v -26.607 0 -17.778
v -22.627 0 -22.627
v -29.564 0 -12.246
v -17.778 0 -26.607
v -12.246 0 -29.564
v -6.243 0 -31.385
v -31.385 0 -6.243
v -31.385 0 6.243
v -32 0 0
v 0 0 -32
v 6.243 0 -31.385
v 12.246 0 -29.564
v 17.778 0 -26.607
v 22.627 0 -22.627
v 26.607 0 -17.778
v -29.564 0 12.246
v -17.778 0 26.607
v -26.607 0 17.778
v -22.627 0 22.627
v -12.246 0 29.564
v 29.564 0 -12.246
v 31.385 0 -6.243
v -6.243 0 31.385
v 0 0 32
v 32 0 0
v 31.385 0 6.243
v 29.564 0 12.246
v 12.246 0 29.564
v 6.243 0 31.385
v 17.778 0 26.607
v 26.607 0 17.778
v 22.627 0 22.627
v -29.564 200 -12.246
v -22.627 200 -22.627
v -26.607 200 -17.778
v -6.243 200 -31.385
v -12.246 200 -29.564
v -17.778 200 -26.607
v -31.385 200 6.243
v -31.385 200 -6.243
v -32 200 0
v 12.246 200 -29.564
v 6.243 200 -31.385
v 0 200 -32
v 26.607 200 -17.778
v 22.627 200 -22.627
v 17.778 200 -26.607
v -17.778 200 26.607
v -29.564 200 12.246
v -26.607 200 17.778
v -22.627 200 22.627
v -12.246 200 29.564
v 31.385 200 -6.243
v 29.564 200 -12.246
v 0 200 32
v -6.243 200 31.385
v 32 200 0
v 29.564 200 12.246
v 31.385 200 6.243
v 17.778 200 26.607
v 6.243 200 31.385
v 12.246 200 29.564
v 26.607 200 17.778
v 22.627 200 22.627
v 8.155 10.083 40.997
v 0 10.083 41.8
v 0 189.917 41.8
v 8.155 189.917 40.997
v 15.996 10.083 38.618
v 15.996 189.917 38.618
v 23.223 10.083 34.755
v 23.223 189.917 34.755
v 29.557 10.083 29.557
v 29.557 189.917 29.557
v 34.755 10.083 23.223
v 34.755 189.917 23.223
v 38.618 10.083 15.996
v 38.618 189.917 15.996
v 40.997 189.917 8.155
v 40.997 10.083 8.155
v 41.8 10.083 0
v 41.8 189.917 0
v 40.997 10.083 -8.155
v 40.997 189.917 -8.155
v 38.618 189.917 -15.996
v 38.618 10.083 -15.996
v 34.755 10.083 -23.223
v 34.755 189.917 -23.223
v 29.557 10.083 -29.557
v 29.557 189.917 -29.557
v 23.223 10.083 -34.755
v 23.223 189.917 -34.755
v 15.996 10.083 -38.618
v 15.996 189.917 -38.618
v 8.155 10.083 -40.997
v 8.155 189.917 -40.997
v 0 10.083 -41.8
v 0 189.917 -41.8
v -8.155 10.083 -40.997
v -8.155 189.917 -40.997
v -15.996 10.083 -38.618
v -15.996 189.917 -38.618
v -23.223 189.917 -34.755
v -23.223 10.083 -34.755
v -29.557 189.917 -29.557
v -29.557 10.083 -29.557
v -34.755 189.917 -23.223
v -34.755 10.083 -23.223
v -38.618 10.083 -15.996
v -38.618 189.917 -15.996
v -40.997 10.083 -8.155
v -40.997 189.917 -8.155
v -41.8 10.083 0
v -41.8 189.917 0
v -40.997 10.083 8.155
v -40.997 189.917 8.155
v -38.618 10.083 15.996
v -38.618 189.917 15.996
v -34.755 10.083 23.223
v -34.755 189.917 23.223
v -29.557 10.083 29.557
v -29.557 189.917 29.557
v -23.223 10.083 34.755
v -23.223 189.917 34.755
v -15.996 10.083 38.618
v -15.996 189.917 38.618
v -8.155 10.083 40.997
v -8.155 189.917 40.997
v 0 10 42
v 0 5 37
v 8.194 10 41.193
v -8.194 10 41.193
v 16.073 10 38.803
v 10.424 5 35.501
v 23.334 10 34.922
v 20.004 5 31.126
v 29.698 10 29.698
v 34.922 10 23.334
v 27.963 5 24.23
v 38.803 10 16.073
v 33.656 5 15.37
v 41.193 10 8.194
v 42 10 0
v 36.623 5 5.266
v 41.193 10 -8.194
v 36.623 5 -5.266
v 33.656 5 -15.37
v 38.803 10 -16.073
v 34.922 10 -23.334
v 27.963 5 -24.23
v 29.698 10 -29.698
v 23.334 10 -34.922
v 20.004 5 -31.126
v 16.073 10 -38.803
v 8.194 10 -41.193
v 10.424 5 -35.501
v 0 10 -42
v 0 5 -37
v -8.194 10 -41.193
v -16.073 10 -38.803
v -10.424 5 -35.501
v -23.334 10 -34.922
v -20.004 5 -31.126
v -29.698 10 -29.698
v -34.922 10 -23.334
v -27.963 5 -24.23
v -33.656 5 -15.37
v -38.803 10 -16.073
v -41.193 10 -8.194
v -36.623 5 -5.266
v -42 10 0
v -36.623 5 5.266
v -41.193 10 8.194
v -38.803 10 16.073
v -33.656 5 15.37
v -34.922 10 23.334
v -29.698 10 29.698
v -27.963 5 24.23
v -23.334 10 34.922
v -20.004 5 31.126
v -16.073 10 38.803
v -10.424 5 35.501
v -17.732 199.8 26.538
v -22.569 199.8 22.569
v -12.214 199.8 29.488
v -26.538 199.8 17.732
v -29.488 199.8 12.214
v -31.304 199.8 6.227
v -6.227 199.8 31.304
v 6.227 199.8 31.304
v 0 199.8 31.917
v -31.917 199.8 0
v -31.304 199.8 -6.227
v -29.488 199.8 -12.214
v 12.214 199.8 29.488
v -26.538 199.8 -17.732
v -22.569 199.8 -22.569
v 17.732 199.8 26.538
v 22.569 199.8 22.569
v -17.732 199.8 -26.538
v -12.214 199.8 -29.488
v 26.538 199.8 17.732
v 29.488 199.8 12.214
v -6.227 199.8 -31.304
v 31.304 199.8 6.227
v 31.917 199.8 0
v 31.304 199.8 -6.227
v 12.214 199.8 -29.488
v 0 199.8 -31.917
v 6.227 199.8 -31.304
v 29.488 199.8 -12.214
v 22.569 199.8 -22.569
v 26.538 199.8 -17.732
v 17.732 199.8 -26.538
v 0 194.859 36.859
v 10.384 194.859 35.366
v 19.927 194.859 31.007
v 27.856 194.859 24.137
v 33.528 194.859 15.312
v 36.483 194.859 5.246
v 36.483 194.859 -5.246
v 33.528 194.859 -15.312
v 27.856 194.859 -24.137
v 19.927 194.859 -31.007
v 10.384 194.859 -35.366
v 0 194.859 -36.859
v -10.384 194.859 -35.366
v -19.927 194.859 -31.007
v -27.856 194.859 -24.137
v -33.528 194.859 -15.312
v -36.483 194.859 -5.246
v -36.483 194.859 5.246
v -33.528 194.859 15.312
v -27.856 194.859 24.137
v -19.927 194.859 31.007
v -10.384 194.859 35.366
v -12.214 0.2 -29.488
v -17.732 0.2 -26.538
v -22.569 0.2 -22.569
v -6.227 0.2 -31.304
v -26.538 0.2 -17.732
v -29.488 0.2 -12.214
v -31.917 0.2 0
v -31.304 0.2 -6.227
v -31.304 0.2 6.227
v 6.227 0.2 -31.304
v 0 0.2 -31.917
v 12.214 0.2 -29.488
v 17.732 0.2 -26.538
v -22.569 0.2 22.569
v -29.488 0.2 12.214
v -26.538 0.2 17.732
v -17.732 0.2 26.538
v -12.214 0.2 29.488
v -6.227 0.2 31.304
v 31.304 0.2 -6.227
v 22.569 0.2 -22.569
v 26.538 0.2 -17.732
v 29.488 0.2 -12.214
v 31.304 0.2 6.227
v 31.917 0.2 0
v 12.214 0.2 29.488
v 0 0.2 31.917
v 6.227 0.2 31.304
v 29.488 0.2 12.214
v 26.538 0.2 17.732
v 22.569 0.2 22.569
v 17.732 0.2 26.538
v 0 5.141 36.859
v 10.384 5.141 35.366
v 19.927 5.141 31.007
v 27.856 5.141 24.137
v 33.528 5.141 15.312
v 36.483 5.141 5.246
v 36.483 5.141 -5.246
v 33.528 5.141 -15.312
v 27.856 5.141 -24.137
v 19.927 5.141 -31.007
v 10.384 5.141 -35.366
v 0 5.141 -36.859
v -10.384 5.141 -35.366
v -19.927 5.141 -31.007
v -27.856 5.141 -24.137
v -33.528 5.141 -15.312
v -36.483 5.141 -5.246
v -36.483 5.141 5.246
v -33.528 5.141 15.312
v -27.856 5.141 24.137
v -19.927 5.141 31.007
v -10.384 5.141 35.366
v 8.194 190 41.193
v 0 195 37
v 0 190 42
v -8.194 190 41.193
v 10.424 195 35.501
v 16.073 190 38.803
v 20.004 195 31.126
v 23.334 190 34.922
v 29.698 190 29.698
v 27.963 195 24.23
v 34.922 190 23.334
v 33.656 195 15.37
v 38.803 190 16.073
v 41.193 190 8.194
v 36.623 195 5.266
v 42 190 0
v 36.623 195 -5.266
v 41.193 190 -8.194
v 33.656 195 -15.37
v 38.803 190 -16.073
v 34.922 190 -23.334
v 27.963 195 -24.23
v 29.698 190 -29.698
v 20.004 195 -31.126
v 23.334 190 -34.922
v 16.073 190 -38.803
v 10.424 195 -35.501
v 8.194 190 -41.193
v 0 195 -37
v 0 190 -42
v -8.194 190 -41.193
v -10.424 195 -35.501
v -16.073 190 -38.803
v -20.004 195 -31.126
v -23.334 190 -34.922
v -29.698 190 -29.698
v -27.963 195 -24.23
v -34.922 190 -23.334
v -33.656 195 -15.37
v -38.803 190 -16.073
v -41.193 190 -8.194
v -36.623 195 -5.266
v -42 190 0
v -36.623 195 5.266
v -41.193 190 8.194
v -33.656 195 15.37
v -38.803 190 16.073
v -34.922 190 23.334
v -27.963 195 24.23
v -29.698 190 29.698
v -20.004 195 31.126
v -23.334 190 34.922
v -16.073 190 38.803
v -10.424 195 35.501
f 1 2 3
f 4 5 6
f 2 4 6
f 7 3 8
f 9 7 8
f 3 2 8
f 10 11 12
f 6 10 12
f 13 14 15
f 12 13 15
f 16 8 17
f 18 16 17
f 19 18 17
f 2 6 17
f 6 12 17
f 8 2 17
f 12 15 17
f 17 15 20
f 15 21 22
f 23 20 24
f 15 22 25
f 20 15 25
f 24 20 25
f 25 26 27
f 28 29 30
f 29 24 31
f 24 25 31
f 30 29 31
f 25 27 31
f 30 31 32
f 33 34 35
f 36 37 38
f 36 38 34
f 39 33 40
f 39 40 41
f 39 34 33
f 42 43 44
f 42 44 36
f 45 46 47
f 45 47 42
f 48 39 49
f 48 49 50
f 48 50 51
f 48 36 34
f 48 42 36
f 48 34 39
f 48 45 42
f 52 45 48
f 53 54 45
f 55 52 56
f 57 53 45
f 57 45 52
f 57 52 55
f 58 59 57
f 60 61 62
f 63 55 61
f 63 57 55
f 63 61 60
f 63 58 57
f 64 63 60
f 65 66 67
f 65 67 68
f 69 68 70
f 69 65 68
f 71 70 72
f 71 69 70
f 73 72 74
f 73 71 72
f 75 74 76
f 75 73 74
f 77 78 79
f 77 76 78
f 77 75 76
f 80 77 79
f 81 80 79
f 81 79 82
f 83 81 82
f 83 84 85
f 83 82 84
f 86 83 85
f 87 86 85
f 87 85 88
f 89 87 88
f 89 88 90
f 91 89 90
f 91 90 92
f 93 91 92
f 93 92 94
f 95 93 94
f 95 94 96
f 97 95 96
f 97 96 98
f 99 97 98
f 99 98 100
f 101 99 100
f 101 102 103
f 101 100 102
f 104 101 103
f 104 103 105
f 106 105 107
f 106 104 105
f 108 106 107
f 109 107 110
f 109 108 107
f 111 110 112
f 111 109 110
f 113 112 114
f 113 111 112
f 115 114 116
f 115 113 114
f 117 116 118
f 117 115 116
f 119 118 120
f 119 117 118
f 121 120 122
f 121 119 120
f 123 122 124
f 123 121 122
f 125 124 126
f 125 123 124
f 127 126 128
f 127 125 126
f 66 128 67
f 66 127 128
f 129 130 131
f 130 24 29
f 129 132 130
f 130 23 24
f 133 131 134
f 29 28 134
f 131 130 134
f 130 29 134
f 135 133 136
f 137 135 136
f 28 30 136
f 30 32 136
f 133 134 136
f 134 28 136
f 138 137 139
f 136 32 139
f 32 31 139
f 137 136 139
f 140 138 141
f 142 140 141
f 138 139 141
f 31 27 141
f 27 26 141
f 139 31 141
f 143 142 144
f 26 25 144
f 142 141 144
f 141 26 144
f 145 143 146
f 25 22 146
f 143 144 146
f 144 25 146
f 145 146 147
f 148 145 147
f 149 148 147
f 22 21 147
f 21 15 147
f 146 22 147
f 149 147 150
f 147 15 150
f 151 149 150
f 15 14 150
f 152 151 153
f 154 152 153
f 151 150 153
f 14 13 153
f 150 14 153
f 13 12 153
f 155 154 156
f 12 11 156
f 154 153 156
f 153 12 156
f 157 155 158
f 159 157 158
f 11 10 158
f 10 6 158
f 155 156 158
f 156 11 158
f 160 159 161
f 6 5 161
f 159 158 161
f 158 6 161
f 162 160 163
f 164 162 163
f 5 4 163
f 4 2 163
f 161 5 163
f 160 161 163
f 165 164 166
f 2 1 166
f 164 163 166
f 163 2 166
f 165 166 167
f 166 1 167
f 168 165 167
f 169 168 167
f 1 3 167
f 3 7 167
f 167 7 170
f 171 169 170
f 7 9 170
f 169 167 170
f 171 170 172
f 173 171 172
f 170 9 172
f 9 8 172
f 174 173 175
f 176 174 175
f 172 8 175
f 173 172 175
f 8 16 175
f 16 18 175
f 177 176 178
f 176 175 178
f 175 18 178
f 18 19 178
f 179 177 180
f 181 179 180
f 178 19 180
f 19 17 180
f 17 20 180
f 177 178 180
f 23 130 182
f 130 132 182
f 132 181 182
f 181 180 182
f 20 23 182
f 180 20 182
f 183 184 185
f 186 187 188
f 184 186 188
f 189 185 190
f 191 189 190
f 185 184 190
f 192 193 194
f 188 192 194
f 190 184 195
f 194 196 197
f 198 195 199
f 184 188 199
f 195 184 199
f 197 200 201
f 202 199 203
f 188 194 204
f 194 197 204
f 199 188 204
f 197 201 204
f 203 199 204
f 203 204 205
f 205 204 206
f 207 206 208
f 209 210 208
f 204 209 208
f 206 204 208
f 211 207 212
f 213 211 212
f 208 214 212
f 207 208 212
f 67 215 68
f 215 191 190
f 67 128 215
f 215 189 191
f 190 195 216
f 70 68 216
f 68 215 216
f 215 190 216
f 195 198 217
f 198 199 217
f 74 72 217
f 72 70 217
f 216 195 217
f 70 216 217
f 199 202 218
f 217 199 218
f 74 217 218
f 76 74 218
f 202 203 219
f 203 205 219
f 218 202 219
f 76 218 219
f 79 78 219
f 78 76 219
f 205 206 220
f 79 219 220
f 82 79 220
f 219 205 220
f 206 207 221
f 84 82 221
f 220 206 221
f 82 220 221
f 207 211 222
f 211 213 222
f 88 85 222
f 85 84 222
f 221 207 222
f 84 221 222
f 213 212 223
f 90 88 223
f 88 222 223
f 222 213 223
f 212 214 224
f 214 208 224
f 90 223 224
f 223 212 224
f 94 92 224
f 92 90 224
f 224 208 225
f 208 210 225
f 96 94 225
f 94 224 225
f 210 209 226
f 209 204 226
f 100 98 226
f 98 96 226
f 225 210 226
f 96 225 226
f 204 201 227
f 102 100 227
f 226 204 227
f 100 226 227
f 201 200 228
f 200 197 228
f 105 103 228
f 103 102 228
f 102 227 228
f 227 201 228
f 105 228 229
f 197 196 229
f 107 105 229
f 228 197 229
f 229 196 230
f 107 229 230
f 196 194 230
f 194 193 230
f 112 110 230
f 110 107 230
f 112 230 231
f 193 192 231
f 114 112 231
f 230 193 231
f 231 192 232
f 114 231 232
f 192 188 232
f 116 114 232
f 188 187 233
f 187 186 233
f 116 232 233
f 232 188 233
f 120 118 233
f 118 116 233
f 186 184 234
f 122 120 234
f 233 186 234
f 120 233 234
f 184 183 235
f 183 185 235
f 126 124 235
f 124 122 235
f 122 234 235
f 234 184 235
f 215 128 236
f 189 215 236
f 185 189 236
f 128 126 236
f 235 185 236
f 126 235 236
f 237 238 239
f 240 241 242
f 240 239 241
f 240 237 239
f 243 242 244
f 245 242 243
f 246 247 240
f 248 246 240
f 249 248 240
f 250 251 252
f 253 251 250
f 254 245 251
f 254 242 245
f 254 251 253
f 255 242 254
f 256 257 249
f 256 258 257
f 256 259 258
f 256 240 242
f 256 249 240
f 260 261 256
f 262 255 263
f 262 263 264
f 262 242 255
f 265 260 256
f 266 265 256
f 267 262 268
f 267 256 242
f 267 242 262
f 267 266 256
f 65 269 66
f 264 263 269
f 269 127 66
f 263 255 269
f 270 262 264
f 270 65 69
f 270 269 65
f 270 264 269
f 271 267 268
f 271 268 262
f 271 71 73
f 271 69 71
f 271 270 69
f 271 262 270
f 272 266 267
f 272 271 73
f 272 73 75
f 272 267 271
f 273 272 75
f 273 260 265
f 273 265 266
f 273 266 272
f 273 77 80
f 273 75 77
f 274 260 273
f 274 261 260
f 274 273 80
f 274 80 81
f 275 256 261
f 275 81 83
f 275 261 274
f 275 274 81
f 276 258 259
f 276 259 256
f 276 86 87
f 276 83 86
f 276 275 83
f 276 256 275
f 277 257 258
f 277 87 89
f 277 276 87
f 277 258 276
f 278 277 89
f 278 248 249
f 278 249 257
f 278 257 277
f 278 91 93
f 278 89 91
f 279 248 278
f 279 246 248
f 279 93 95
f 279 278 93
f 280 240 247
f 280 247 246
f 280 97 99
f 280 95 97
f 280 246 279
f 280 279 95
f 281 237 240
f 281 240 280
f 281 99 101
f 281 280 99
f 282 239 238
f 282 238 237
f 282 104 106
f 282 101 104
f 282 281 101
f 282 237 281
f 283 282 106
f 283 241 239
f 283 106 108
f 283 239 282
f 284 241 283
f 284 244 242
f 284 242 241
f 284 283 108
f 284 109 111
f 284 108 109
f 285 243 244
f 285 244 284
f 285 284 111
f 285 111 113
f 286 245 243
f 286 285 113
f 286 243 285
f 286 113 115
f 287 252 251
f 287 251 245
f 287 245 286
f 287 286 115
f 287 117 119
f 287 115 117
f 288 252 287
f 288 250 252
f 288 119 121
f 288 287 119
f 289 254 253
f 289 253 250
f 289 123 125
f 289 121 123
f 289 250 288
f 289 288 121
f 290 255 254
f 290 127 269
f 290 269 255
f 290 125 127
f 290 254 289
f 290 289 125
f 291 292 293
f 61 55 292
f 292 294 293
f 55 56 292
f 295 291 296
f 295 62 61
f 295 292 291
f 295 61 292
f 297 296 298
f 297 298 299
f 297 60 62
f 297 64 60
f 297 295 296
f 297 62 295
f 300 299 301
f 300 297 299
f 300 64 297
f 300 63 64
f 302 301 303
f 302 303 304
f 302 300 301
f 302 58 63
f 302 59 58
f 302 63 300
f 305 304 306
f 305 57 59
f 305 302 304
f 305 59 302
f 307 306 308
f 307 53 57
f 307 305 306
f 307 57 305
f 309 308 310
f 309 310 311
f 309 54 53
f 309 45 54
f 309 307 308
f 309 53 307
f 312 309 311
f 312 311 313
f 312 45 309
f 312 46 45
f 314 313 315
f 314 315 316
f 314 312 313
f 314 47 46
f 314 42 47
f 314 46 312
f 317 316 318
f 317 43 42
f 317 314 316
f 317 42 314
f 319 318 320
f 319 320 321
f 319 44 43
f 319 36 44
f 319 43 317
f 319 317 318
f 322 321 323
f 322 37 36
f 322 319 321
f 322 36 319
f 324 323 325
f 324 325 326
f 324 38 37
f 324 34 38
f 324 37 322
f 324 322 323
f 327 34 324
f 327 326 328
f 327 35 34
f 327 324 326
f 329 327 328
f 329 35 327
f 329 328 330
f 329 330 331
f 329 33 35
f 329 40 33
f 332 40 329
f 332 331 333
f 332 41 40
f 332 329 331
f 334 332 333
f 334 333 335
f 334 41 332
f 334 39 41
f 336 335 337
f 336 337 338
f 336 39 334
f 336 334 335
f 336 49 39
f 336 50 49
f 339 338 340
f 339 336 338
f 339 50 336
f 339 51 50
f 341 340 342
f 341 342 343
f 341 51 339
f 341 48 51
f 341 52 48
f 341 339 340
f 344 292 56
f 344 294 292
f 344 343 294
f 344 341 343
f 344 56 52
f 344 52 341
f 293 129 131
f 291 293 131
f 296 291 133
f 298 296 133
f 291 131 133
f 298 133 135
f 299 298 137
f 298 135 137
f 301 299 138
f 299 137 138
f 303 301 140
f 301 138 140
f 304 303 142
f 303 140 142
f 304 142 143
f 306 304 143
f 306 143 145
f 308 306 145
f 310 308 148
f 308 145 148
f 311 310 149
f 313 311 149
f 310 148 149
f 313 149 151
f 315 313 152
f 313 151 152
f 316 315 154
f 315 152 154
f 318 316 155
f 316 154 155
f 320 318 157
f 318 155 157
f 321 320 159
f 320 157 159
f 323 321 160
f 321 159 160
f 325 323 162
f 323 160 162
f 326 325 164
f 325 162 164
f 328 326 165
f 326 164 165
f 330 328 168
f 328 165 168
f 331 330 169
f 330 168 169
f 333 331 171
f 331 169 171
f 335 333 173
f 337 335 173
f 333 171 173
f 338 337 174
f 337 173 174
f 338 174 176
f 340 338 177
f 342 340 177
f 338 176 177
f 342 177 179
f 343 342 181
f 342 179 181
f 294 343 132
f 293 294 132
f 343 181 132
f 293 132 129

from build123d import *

# Parameters (mm, degrees)
SZKIC1_R                    = 42
DODANIE_WYCI_GNI_CIE1_DEPTH = 200
SFAZOWANIE1_SIZE            = 10
SKORUPA1_T                  = -0.2
SZKIC8_R                    = 32
DODANIE_WYCI_GNI_CIE4_DEPTH = 0.2


with BuildPart() as part:
    # Szkic1 → Dodanie-wyciągnięcie1 (new body)
    with BuildSketch(Plane(origin=(0, 0, 0), x_dir=(1, 0, 0), z_dir=(0, 1, 0))):
        with Locations(Location((0, 0, 0), (0, 0, 270))):
            Circle(SZKIC1_R)
    extrude(amount=DODANIE_WYCI_GNI_CIE1_DEPTH)

    # Sfazowanie1
    sfazowanie1_edges = [part.edges().sort_by_distance(p)[0] for p in [
        (0, 0, -42),
        (0, 200, -42),
    ]]
    chamfer(sfazowanie1_edges, length=SFAZOWANIE1_SIZE)

    # Skorupa1
    skorupa1_openings = [part.faces().sort_by_distance(p)[0] for p in [
        (0, 200, 0),
    ]]
    offset(amount=SKORUPA1_T, openings=skorupa1_openings, kind=Kind.INTERSECTION)

    # Szkic8 → Dodanie-wyciągnięcie4 (add)
    with BuildSketch(Plane(origin=(0, 200, 0), x_dir=(1, 0, 0), z_dir=(0, 1, 0))):
        Circle(SZKIC8_R)
    extrude(amount=-DODANIE_WYCI_GNI_CIE4_DEPTH)


solid = part.part
